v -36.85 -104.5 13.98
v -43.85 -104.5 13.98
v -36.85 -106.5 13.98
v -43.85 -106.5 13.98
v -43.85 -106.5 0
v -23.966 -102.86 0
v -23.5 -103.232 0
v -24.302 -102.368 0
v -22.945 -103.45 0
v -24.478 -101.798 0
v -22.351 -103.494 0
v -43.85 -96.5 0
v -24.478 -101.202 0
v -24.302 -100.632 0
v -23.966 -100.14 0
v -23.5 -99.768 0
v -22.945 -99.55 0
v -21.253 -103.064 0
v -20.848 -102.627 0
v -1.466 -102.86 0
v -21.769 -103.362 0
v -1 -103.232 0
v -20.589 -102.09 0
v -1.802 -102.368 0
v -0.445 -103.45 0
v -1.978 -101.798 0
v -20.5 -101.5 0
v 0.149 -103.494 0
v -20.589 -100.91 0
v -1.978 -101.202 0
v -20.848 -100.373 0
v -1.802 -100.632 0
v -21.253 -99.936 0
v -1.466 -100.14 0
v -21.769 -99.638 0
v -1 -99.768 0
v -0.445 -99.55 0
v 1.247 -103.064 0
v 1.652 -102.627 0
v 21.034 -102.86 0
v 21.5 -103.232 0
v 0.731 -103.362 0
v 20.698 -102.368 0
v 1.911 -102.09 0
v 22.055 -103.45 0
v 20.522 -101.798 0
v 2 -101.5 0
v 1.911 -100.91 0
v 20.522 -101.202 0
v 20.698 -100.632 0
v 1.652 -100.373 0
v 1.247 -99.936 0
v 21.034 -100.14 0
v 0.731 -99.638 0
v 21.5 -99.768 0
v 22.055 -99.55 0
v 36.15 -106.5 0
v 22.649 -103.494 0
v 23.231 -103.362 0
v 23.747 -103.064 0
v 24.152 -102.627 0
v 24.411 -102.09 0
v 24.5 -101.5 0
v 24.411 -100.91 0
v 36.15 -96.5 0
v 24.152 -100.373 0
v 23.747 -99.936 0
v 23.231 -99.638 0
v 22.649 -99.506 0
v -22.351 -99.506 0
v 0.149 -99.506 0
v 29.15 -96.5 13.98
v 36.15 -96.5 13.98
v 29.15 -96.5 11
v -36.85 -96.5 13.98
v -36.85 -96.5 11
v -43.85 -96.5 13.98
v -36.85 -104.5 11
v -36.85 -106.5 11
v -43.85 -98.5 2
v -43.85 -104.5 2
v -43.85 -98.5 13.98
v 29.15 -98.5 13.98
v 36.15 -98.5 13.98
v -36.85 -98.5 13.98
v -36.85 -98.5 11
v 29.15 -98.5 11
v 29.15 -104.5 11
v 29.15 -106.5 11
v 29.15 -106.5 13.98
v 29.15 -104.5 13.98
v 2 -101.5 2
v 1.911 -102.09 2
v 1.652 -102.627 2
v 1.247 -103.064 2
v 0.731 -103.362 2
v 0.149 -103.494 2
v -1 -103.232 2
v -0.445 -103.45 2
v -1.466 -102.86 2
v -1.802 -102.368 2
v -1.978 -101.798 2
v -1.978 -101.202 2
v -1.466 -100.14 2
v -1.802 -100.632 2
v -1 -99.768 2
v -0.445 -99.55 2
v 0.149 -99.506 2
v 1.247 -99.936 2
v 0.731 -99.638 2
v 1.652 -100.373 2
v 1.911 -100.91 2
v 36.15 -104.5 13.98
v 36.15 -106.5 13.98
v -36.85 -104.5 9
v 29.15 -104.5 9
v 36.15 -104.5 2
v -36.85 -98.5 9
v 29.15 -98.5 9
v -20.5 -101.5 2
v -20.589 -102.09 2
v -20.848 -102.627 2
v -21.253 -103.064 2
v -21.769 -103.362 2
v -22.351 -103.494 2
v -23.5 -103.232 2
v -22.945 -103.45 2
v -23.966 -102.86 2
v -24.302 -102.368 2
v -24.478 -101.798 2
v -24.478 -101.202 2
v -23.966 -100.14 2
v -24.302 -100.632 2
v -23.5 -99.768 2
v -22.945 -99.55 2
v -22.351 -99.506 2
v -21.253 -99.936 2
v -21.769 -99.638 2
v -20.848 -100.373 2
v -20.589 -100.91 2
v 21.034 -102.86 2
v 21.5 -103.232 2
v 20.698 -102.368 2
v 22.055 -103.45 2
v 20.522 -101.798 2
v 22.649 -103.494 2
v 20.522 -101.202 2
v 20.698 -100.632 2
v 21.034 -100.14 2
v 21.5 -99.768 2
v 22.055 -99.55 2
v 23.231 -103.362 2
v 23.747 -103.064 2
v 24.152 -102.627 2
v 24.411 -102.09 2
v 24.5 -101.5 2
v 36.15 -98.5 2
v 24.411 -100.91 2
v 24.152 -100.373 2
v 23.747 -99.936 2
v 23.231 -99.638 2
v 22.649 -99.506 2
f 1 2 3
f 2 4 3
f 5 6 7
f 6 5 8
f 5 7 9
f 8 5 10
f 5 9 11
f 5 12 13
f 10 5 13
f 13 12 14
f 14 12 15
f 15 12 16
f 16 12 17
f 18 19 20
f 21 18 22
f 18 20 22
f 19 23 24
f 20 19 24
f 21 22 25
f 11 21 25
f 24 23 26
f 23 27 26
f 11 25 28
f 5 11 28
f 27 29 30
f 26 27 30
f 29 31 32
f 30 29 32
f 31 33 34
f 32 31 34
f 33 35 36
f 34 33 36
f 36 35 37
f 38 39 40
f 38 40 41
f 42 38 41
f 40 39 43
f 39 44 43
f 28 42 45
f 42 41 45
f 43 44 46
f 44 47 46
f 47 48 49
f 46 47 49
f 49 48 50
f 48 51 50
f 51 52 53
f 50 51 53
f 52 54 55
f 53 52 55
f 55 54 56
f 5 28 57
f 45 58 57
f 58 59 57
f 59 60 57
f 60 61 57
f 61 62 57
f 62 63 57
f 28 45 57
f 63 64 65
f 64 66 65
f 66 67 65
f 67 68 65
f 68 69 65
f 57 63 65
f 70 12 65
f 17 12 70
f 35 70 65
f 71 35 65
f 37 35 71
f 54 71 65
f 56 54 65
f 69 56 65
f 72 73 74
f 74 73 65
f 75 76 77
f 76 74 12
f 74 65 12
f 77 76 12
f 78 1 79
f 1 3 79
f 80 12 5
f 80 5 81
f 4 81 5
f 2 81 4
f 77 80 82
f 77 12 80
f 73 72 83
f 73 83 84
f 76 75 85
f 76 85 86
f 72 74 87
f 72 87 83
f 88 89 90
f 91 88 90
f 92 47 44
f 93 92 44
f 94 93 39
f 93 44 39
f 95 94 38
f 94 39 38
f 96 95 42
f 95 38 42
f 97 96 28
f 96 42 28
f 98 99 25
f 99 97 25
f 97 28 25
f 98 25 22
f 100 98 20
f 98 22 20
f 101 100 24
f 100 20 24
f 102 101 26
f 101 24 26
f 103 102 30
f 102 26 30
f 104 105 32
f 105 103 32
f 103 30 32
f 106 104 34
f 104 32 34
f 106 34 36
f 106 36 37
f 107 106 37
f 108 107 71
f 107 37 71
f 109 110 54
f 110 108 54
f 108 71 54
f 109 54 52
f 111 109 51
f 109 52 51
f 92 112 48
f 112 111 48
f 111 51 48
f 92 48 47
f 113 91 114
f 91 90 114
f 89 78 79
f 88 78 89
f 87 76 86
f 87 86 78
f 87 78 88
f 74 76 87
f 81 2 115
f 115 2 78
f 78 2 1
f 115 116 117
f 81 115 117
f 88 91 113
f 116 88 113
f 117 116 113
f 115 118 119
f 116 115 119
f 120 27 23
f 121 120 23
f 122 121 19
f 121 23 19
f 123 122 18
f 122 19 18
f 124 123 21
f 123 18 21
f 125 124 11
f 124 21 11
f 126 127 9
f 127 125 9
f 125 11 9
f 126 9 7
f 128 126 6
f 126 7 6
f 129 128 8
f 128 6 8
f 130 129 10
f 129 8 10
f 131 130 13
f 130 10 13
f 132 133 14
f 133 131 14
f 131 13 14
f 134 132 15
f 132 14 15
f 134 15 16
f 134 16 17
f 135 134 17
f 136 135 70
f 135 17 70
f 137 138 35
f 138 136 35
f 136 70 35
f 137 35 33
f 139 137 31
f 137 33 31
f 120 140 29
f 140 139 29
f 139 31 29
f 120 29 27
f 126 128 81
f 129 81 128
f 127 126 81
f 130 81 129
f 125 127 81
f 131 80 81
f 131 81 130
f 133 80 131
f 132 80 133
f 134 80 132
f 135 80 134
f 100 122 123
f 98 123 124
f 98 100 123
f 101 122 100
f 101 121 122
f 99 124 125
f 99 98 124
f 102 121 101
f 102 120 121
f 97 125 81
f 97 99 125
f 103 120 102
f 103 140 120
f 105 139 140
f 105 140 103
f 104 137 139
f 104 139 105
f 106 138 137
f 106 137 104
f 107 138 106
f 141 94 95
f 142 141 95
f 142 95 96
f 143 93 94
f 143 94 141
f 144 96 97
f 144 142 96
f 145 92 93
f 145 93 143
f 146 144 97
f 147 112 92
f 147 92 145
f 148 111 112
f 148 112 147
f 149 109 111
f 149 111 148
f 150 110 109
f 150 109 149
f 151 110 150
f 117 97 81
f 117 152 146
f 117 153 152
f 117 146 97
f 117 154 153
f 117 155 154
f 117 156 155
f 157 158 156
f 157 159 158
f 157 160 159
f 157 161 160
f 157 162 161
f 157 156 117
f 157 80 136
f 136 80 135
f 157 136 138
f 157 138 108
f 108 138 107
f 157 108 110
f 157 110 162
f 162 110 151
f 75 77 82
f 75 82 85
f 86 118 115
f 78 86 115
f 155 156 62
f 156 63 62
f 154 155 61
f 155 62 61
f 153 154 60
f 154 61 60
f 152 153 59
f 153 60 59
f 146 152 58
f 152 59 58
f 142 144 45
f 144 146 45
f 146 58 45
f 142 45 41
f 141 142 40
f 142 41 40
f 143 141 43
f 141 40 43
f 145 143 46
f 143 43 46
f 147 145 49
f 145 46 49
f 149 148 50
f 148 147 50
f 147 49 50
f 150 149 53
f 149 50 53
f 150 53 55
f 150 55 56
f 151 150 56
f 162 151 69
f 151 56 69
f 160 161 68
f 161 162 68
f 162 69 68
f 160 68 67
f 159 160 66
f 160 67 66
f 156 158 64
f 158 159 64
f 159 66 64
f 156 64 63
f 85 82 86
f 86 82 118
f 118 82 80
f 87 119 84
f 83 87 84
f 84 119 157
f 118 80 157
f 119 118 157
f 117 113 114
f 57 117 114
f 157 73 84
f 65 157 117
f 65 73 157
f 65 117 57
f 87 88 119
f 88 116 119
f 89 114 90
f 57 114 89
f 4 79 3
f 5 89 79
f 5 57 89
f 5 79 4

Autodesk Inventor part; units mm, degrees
ref_plane "YZ Plane" through (0, 0, 0) normal (1, 0, 0) x (0, 1, 0)
ref_plane "XZ Plane" through (0, 0, 0) normal (0, 1, 0) x (-1, 0, 0)
ref_plane "XY Plane" through (0, 0, 0) normal (0, 0, 1) x (1, 0, 0)
ref_plane "РабПлоскость1" through (0, 0, 0) normal (0, 0, 1) x (1, 0, 0)
sketch "Эскиз1" plane through (0, 0, 0) normal (0, 0, 1) x (1, 0, 0)
  line L0 (36.1495, -96.5) -> (-43.8505, -96.5)
  line L1 (-43.8505, -96.5) -> (-43.8505, -106.5)
  line L2 (-43.8505, -106.5) -> (36.1495, -106.5)
  line L3 (36.1495, -106.5) -> (36.1495, -96.5)
  line L4 (22.5, -91.5) -> (-22.5, -91.5) projected
  circle A0 centre (0, -101.5) radius 2
  circle A1 centre (22.5, -101.5) radius 2
  circle A2 centre (-22.5, -101.5) radius 2
  point P0 (0, 0)
  dimension "d0" = 80
  dimension "d1" = 10
  dimension "d2" = 5
  dimension "d3" = 4
  dimension "d5" = 4
  dimension "d6" = 4
extrude "Выдавливание1" add sketch "Эскиз1" along normal blind 2
sketch "Эскиз2" plane through (0, 0, 2) normal (0, 0, 1) x (1, 0, 0)
  point P0 (0, 0)
sketch "Эскиз3" plane through (-43.8505, -106.5, 0) normal (0, -1, 0) x (1, 0, 0)
  line L0 (0, 0) -> (0, 2) projected
  line L1 (0, 2) -> (0, 13.9799)
  line L2 (0, 13.9799) -> (7, 13.9799)
  line L3 (7, 13.9799) -> (7, 9)
  line L4 (7, 9) -> (73, 9)
  line L5 (73, 9) -> (73, 13.9799)
  line L6 (73, 13.9799) -> (80, 13.9799)
  line L7 (80, 13.9799) -> (80, 2)
  line L8 (0, 2) -> (80, 2)
  point P0 (43.8505, 0)
  point P1 (80, 2)
  dimension "d9" = 7
  dimension "d10" = 7
  dimension "d15" = 7
extrude "Выдавливание2" add sketch "Эскиз3" against normal blind 2
sketch "Эскиз4" plane through (-43.8505, -96.5, 0) normal (0, 1, 0) x (1, 0, 0)
  line L0 (0, -2) -> (80, -2) projected
  line L1 (0, -2) -> (0, -13.9799) projected
  line L2 (0, -13.9799) -> (7, -13.9799) projected
  line L3 (7, -13.9799) -> (7, -9) projected
  line L4 (7, -9) -> (73, -9) projected
  line L5 (73, -9) -> (73, -13.9799) projected
  line L6 (73, -13.9799) -> (80, -13.9799) projected
  line L7 (80, -13.9799) -> (80, -2) projected
  point P0 (43.8505, 0)
extrude "Выдавливание3" add sketch "Эскиз4" against normal blind 2
sketch "Эскиз5" plane through (-36.8505, -96.5, 9) normal (0, 0, 1) x (1, 0, 0)
  line L0 (66, -10) -> (0, -10) projected
  line L1 (3.8262, -0.07) -> (63.012, -0.07)
  line L2 (63.012, -10) -> (3.8262, -10)
  line L3 (66, 0) -> (66, -2) projected
  line L4 (0, -10) -> (66, -10)
  line L5 (66, -10) -> (66, 0)
  line L6 (66, 0) -> (0, 0)
  line L7 (0, 0) -> (0, -10)
  point P0 (36.8505, 96.5)
extrude "Выдавливание4" add sketch "Эскиз5" along normal blind 2
properties part number "деталь держит провода"
